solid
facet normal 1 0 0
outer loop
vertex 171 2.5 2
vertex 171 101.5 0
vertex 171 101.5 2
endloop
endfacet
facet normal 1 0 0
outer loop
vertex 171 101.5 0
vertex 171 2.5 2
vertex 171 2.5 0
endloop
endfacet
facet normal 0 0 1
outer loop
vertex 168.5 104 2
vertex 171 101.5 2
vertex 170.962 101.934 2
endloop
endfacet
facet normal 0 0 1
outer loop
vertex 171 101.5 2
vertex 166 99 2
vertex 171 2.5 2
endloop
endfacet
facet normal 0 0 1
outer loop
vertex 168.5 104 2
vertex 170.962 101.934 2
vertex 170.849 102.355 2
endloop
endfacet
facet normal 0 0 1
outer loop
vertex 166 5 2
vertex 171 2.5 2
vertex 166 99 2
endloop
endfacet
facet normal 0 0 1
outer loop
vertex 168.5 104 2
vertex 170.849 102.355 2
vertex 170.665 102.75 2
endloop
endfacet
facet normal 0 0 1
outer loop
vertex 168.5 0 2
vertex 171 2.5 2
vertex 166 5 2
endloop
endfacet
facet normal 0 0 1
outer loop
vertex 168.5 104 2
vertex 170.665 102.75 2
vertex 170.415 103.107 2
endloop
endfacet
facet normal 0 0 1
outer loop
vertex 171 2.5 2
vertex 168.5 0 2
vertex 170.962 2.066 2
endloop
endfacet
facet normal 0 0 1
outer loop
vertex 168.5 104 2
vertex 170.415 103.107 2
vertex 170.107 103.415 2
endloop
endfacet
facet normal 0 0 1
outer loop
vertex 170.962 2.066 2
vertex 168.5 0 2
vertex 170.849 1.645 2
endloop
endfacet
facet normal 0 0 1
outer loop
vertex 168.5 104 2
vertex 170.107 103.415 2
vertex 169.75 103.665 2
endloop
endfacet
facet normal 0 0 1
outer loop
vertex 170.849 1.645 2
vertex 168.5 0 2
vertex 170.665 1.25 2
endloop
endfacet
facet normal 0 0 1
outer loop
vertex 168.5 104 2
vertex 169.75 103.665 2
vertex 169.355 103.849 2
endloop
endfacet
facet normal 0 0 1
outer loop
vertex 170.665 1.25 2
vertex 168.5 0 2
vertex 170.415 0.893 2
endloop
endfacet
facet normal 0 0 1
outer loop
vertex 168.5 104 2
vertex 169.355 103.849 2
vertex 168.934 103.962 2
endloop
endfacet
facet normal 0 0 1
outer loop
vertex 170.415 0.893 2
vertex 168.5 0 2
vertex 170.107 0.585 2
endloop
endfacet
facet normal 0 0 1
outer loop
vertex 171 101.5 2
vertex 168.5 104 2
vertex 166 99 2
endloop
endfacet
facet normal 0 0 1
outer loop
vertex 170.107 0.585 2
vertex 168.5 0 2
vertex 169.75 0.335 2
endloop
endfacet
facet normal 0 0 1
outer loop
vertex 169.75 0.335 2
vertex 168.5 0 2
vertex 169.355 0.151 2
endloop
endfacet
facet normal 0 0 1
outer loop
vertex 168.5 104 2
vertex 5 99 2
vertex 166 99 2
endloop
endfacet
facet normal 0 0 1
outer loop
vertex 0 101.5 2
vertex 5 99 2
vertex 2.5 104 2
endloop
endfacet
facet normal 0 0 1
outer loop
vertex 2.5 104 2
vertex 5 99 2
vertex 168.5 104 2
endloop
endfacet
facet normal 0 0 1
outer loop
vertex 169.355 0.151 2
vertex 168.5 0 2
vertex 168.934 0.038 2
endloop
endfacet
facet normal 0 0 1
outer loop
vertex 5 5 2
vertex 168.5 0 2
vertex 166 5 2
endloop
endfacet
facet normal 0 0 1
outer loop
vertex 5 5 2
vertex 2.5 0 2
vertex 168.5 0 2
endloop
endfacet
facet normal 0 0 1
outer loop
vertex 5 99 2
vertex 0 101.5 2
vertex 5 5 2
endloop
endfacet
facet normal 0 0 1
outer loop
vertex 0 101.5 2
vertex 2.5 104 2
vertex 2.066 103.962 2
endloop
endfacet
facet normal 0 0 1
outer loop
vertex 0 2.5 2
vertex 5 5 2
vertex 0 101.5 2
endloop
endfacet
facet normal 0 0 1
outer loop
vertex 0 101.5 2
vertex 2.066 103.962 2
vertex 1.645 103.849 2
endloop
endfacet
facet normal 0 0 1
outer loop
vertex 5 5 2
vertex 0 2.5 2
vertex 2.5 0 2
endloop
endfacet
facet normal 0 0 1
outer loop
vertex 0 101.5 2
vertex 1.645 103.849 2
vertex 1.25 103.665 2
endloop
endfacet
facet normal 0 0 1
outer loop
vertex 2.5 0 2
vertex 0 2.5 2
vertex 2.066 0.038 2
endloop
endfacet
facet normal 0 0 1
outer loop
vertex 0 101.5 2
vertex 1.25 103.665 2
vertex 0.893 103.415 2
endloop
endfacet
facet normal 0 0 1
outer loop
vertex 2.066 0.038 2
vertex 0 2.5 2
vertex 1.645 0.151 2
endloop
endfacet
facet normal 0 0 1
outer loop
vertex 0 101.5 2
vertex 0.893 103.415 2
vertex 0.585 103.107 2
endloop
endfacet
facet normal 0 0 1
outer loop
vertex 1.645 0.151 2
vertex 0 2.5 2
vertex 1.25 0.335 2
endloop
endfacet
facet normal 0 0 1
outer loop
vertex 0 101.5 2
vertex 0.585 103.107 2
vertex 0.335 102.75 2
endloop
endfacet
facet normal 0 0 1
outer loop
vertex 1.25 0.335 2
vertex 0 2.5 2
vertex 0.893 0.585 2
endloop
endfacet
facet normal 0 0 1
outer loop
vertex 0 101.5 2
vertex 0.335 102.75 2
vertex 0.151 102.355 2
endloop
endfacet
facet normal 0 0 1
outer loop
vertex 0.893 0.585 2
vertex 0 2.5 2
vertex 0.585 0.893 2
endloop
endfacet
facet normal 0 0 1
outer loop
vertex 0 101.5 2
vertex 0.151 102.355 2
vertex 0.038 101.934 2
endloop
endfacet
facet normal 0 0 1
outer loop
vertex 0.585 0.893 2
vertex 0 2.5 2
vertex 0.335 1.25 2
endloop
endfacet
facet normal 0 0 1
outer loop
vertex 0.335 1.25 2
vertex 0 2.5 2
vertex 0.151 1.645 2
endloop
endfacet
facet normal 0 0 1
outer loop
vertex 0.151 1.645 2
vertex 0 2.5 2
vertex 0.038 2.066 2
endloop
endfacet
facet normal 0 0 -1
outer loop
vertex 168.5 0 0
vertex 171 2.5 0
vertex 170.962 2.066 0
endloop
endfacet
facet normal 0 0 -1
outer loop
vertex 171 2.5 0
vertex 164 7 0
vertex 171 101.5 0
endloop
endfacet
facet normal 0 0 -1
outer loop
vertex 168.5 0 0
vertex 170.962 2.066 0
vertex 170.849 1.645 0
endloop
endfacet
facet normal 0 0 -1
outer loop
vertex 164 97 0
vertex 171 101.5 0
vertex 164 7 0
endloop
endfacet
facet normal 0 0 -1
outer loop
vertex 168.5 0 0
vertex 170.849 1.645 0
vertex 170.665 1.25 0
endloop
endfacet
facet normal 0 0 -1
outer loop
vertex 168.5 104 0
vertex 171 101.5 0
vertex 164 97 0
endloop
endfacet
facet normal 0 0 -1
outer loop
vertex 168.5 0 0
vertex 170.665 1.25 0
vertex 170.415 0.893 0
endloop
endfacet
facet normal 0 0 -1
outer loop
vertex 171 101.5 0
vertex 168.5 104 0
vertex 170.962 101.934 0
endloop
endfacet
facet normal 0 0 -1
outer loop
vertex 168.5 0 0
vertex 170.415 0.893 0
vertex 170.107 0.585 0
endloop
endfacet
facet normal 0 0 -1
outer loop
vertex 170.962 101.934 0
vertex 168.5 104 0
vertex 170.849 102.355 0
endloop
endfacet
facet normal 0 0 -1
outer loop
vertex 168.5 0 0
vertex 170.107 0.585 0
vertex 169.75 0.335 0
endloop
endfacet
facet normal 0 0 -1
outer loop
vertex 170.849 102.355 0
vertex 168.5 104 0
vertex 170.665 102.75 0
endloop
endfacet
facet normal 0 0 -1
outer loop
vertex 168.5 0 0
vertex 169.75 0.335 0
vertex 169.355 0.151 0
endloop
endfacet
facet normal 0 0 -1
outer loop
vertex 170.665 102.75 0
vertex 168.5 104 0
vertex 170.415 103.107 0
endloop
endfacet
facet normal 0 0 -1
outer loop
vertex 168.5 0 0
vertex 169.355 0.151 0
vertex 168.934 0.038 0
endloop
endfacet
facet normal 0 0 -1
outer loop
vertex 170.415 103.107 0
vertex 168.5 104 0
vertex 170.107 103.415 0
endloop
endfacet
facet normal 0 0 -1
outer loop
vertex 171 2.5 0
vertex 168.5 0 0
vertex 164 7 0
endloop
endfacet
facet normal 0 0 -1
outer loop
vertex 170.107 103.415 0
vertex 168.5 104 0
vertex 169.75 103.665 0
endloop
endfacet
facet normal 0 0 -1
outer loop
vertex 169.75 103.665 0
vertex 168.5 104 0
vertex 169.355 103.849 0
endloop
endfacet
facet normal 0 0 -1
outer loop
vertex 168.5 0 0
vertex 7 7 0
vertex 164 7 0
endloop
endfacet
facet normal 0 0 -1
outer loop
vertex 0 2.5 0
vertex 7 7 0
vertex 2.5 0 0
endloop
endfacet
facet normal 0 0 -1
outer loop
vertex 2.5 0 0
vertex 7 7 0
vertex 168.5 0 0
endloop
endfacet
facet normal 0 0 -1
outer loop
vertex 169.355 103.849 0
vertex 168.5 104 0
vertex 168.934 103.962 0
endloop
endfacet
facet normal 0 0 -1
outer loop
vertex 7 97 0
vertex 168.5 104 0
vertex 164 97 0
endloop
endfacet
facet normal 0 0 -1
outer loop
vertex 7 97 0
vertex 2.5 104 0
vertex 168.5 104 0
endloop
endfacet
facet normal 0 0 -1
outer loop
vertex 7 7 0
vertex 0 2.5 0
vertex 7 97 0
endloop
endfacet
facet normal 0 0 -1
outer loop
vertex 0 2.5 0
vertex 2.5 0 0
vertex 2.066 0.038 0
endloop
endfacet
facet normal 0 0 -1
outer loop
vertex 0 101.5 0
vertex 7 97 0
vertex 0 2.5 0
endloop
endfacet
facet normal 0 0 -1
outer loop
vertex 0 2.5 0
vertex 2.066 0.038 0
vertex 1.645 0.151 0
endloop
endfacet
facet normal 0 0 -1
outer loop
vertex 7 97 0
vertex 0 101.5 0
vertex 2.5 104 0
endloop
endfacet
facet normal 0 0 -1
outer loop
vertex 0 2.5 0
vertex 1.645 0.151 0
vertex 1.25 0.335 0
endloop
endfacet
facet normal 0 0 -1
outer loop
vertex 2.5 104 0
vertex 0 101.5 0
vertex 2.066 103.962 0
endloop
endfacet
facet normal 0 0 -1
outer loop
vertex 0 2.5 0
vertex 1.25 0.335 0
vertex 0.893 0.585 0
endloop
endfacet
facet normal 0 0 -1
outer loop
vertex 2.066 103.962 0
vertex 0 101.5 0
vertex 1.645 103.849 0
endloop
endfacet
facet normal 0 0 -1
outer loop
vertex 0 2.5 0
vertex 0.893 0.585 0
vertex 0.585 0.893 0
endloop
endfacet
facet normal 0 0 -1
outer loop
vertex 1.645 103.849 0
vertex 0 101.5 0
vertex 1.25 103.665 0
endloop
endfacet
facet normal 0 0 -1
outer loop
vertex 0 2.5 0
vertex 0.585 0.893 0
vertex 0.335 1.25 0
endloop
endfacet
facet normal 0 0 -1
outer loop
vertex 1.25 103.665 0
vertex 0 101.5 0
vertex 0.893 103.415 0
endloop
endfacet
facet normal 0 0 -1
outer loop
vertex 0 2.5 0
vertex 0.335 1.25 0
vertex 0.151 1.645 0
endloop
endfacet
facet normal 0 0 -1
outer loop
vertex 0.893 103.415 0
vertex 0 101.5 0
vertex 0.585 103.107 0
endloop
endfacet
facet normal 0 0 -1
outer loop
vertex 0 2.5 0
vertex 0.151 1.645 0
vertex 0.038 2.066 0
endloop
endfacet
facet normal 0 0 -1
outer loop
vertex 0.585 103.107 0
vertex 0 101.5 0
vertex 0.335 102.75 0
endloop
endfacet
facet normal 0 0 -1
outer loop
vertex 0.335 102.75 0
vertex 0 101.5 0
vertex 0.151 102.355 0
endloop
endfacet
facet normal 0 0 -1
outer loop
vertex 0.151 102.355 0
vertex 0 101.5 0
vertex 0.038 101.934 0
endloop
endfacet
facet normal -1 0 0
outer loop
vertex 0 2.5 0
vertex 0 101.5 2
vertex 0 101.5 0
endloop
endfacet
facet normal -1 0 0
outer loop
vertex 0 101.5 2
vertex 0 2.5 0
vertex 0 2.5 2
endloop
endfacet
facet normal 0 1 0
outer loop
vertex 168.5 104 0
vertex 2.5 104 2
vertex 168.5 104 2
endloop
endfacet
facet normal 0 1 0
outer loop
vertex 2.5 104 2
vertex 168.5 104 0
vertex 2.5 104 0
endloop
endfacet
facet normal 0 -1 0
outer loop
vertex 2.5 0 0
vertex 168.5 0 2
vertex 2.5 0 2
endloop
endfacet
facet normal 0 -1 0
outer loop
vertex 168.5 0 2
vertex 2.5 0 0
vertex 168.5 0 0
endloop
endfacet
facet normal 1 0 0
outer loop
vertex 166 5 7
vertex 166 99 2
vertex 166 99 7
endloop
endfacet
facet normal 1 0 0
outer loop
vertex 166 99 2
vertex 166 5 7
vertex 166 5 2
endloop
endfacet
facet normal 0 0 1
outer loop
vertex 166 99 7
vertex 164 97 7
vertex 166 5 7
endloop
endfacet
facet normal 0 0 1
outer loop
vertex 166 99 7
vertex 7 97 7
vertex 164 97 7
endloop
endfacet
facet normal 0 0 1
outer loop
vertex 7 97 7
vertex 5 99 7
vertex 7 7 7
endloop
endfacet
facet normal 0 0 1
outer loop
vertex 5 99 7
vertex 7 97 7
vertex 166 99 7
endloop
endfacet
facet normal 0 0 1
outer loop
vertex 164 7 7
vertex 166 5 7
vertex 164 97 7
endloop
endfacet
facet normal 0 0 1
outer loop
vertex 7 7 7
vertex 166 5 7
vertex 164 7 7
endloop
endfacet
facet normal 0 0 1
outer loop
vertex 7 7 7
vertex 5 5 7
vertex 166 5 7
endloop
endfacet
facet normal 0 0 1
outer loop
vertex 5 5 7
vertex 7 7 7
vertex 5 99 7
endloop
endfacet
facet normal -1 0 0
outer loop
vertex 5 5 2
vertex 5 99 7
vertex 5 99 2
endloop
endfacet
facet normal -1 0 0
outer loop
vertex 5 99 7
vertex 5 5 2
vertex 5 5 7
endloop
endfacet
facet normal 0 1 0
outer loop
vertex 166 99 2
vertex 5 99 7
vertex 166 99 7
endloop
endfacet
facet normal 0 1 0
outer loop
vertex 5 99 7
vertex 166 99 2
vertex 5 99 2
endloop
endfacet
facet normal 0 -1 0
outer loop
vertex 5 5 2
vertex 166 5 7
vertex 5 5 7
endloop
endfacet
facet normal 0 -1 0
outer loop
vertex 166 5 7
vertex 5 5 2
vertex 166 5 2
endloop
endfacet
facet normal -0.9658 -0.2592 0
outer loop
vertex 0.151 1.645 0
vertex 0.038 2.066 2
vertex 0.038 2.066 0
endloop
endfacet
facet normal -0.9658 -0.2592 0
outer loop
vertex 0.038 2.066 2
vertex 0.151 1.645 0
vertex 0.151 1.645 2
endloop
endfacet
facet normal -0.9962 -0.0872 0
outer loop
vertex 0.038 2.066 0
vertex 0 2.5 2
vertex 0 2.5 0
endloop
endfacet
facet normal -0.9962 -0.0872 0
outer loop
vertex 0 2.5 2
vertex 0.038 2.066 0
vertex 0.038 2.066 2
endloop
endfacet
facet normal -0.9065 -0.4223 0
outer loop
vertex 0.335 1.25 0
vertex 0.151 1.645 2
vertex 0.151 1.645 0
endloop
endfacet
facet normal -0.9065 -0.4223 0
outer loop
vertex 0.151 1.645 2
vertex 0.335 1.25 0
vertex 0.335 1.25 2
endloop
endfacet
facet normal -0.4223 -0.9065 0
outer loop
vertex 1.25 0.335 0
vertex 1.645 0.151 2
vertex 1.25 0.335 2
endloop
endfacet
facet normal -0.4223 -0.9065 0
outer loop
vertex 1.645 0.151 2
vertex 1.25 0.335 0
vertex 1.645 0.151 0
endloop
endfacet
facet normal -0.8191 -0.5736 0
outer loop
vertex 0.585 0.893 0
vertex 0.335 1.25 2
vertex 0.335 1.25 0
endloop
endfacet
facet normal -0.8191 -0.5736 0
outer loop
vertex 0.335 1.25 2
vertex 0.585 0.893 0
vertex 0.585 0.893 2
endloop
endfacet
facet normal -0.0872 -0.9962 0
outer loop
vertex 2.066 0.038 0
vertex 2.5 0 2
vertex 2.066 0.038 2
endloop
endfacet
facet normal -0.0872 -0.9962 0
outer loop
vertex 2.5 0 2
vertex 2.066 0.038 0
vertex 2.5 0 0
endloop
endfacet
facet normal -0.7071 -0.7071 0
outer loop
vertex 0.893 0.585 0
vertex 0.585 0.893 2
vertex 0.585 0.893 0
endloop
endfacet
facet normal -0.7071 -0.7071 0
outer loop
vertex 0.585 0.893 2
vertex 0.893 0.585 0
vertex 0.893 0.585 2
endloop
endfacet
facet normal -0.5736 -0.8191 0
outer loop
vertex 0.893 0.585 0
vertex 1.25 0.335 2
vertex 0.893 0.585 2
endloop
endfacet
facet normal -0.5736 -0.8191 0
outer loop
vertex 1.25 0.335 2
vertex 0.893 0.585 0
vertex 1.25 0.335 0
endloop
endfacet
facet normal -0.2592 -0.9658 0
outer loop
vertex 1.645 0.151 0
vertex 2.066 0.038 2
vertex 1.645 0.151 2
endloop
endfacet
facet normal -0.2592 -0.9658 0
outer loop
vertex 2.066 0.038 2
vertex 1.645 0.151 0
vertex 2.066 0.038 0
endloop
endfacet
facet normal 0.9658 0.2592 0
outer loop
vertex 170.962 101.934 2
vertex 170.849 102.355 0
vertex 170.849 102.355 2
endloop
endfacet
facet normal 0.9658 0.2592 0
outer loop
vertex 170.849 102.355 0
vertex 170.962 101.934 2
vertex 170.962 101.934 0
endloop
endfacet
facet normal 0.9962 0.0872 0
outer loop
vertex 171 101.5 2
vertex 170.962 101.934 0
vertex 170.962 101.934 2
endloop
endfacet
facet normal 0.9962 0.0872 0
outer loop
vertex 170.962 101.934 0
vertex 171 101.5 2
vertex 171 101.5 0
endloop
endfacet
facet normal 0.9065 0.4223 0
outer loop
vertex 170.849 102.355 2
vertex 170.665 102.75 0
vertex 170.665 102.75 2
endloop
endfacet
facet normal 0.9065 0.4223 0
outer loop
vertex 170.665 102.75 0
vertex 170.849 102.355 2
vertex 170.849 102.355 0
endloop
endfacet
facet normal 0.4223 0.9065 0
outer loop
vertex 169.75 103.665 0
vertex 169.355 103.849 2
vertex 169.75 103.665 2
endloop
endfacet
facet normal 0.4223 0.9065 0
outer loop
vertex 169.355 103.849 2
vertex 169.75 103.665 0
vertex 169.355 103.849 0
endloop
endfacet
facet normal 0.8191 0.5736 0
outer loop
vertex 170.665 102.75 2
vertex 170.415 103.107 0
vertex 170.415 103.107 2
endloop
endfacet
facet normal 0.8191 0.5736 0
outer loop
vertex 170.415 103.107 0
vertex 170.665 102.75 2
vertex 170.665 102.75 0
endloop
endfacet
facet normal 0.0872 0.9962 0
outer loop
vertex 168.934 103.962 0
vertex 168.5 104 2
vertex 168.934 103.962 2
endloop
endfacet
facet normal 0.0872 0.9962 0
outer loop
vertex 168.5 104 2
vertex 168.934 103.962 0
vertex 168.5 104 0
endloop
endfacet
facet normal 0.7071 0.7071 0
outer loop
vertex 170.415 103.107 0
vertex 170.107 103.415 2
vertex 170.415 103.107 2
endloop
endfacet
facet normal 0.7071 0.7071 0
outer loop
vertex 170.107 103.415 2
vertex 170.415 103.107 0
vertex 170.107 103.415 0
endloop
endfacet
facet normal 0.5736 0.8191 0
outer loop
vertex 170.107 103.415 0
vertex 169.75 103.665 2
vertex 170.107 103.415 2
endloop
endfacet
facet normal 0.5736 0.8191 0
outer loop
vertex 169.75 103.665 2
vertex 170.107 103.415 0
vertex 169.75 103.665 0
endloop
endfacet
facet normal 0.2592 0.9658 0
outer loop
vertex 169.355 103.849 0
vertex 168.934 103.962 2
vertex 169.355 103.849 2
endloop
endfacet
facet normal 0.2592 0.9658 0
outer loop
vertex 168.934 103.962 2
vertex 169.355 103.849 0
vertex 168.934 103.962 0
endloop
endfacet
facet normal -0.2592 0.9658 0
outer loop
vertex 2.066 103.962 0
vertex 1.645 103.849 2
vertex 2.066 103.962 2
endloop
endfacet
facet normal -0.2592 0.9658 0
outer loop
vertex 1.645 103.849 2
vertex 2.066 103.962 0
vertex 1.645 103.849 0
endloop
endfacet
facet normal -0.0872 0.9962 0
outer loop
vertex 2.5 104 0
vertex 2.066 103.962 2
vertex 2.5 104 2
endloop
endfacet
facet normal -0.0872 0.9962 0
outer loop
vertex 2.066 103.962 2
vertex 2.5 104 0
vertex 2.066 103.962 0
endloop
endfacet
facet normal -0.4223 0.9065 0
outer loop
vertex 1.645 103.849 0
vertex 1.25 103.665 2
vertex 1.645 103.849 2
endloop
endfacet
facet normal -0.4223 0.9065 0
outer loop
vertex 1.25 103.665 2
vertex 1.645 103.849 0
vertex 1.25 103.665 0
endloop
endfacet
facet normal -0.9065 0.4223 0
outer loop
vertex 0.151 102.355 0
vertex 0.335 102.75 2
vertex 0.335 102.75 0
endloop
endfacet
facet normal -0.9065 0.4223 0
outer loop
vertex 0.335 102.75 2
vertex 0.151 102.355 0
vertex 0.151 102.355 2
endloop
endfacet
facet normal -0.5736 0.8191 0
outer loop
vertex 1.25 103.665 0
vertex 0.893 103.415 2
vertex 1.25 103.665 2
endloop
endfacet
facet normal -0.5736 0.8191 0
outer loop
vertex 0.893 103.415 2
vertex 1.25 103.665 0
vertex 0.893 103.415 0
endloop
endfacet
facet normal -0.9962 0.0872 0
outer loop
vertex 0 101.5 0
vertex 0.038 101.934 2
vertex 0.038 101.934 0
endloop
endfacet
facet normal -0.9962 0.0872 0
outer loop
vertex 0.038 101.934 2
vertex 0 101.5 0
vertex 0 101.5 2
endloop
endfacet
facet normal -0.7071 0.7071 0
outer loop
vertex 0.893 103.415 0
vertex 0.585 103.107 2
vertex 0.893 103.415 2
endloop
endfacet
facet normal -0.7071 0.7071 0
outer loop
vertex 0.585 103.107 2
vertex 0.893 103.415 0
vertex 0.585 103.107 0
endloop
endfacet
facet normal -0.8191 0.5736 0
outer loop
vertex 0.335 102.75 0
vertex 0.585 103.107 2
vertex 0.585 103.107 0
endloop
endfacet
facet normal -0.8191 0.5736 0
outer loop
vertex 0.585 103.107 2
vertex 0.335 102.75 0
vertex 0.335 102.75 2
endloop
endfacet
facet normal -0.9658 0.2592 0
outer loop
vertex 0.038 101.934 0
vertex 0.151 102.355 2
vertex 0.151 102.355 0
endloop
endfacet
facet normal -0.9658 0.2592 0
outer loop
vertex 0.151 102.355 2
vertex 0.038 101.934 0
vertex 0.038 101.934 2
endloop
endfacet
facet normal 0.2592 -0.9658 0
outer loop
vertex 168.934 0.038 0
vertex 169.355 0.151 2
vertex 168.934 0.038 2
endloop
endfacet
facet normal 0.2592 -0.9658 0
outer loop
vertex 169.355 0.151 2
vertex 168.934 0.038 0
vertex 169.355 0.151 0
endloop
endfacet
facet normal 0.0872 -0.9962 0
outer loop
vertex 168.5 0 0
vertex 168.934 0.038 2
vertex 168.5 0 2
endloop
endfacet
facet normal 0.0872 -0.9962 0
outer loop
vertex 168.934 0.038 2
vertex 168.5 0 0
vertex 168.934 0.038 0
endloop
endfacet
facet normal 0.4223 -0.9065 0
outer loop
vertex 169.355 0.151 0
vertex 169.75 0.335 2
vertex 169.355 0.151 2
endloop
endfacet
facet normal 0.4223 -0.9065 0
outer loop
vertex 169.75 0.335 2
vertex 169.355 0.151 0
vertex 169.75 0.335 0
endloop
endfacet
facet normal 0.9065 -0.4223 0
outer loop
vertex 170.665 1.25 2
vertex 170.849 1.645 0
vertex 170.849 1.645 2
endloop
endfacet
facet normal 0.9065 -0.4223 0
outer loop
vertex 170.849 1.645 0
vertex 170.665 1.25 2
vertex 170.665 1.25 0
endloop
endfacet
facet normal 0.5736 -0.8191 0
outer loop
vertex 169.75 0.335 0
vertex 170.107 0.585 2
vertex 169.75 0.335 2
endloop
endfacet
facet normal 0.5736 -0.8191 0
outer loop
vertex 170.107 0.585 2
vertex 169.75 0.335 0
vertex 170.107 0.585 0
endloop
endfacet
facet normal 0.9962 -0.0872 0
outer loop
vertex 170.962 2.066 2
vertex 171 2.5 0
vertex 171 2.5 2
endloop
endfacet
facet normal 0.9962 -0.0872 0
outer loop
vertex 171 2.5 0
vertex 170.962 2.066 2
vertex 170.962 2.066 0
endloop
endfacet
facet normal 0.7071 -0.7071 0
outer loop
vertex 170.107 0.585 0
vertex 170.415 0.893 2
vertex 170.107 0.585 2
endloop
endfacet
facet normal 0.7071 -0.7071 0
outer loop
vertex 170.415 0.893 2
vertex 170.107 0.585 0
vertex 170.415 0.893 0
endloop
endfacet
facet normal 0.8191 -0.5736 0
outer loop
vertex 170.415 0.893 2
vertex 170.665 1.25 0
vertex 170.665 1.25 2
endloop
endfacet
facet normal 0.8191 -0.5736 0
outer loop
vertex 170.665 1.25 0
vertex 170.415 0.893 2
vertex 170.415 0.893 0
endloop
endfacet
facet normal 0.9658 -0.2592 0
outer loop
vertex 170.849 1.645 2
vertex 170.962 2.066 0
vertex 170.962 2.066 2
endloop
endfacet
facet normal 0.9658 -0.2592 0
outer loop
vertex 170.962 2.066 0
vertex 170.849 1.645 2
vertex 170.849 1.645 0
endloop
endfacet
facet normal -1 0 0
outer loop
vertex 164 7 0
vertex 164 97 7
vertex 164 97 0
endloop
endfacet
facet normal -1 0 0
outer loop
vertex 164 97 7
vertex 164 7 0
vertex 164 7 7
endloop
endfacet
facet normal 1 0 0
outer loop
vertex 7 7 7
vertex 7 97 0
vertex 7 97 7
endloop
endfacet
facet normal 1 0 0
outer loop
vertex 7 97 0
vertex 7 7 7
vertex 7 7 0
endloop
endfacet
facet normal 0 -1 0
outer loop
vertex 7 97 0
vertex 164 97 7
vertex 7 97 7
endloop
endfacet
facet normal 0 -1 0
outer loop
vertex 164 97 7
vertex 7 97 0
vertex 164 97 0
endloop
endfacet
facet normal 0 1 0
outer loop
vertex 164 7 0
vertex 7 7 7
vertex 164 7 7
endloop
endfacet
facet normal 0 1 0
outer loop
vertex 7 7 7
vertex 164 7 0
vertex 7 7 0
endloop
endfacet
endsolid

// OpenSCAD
aperture_width = 161;
aperture_height = 94;
frame_thickness = 2;
outer_frame_width = 5;
lip_depth = 5;
rounded_corners = true;

/* [Hidden] */
$fn = 36;

frame_total_width = aperture_width + (2 * outer_frame_width);
frame_total_height = aperture_height + (2 * outer_frame_width);

half_frame_width = outer_frame_width / 2;

module RoundedCorner() {
    intersection() {
        cylinder(r1=half_frame_width, r2=half_frame_width, frame_thickness);

        cube([
            half_frame_width,
            half_frame_width,
            frame_thickness
        ]);
    }
}

module RoundedCornerMask() {
    difference() {
        cube([half_frame_width+1, half_frame_width+1, frame_thickness]);
        RoundedCorner();
    }
}

difference() {
    union() {
        cube([frame_total_width, frame_total_height, frame_thickness]);
        translate([outer_frame_width, outer_frame_width, frame_thickness]) cube([aperture_width, aperture_height, lip_depth]);
    };
    
    translate([
        outer_frame_width + frame_thickness,
        outer_frame_width + frame_thickness,
        0
    ]) {
        cube([
            aperture_width - (2 * frame_thickness),
            aperture_height - (2 * frame_thickness),
            frame_thickness + lip_depth + 2
        ]);
    }
    
    if (rounded_corners) {
        translate([half_frame_width, half_frame_width, 0]) rotate([0, 0, 180]) RoundedCornerMask();
        translate([frame_total_width - half_frame_width, frame_total_height - half_frame_width, 0]) rotate([0, 0, 0]) RoundedCornerMask();
        translate([half_frame_width, frame_total_height - half_frame_width, 0]) rotate([0, 0, 90]) RoundedCornerMask();
        translate([frame_total_width - half_frame_width, half_frame_width, 0]) rotate([0, 0, 270]) RoundedCornerMask();
    }
}
